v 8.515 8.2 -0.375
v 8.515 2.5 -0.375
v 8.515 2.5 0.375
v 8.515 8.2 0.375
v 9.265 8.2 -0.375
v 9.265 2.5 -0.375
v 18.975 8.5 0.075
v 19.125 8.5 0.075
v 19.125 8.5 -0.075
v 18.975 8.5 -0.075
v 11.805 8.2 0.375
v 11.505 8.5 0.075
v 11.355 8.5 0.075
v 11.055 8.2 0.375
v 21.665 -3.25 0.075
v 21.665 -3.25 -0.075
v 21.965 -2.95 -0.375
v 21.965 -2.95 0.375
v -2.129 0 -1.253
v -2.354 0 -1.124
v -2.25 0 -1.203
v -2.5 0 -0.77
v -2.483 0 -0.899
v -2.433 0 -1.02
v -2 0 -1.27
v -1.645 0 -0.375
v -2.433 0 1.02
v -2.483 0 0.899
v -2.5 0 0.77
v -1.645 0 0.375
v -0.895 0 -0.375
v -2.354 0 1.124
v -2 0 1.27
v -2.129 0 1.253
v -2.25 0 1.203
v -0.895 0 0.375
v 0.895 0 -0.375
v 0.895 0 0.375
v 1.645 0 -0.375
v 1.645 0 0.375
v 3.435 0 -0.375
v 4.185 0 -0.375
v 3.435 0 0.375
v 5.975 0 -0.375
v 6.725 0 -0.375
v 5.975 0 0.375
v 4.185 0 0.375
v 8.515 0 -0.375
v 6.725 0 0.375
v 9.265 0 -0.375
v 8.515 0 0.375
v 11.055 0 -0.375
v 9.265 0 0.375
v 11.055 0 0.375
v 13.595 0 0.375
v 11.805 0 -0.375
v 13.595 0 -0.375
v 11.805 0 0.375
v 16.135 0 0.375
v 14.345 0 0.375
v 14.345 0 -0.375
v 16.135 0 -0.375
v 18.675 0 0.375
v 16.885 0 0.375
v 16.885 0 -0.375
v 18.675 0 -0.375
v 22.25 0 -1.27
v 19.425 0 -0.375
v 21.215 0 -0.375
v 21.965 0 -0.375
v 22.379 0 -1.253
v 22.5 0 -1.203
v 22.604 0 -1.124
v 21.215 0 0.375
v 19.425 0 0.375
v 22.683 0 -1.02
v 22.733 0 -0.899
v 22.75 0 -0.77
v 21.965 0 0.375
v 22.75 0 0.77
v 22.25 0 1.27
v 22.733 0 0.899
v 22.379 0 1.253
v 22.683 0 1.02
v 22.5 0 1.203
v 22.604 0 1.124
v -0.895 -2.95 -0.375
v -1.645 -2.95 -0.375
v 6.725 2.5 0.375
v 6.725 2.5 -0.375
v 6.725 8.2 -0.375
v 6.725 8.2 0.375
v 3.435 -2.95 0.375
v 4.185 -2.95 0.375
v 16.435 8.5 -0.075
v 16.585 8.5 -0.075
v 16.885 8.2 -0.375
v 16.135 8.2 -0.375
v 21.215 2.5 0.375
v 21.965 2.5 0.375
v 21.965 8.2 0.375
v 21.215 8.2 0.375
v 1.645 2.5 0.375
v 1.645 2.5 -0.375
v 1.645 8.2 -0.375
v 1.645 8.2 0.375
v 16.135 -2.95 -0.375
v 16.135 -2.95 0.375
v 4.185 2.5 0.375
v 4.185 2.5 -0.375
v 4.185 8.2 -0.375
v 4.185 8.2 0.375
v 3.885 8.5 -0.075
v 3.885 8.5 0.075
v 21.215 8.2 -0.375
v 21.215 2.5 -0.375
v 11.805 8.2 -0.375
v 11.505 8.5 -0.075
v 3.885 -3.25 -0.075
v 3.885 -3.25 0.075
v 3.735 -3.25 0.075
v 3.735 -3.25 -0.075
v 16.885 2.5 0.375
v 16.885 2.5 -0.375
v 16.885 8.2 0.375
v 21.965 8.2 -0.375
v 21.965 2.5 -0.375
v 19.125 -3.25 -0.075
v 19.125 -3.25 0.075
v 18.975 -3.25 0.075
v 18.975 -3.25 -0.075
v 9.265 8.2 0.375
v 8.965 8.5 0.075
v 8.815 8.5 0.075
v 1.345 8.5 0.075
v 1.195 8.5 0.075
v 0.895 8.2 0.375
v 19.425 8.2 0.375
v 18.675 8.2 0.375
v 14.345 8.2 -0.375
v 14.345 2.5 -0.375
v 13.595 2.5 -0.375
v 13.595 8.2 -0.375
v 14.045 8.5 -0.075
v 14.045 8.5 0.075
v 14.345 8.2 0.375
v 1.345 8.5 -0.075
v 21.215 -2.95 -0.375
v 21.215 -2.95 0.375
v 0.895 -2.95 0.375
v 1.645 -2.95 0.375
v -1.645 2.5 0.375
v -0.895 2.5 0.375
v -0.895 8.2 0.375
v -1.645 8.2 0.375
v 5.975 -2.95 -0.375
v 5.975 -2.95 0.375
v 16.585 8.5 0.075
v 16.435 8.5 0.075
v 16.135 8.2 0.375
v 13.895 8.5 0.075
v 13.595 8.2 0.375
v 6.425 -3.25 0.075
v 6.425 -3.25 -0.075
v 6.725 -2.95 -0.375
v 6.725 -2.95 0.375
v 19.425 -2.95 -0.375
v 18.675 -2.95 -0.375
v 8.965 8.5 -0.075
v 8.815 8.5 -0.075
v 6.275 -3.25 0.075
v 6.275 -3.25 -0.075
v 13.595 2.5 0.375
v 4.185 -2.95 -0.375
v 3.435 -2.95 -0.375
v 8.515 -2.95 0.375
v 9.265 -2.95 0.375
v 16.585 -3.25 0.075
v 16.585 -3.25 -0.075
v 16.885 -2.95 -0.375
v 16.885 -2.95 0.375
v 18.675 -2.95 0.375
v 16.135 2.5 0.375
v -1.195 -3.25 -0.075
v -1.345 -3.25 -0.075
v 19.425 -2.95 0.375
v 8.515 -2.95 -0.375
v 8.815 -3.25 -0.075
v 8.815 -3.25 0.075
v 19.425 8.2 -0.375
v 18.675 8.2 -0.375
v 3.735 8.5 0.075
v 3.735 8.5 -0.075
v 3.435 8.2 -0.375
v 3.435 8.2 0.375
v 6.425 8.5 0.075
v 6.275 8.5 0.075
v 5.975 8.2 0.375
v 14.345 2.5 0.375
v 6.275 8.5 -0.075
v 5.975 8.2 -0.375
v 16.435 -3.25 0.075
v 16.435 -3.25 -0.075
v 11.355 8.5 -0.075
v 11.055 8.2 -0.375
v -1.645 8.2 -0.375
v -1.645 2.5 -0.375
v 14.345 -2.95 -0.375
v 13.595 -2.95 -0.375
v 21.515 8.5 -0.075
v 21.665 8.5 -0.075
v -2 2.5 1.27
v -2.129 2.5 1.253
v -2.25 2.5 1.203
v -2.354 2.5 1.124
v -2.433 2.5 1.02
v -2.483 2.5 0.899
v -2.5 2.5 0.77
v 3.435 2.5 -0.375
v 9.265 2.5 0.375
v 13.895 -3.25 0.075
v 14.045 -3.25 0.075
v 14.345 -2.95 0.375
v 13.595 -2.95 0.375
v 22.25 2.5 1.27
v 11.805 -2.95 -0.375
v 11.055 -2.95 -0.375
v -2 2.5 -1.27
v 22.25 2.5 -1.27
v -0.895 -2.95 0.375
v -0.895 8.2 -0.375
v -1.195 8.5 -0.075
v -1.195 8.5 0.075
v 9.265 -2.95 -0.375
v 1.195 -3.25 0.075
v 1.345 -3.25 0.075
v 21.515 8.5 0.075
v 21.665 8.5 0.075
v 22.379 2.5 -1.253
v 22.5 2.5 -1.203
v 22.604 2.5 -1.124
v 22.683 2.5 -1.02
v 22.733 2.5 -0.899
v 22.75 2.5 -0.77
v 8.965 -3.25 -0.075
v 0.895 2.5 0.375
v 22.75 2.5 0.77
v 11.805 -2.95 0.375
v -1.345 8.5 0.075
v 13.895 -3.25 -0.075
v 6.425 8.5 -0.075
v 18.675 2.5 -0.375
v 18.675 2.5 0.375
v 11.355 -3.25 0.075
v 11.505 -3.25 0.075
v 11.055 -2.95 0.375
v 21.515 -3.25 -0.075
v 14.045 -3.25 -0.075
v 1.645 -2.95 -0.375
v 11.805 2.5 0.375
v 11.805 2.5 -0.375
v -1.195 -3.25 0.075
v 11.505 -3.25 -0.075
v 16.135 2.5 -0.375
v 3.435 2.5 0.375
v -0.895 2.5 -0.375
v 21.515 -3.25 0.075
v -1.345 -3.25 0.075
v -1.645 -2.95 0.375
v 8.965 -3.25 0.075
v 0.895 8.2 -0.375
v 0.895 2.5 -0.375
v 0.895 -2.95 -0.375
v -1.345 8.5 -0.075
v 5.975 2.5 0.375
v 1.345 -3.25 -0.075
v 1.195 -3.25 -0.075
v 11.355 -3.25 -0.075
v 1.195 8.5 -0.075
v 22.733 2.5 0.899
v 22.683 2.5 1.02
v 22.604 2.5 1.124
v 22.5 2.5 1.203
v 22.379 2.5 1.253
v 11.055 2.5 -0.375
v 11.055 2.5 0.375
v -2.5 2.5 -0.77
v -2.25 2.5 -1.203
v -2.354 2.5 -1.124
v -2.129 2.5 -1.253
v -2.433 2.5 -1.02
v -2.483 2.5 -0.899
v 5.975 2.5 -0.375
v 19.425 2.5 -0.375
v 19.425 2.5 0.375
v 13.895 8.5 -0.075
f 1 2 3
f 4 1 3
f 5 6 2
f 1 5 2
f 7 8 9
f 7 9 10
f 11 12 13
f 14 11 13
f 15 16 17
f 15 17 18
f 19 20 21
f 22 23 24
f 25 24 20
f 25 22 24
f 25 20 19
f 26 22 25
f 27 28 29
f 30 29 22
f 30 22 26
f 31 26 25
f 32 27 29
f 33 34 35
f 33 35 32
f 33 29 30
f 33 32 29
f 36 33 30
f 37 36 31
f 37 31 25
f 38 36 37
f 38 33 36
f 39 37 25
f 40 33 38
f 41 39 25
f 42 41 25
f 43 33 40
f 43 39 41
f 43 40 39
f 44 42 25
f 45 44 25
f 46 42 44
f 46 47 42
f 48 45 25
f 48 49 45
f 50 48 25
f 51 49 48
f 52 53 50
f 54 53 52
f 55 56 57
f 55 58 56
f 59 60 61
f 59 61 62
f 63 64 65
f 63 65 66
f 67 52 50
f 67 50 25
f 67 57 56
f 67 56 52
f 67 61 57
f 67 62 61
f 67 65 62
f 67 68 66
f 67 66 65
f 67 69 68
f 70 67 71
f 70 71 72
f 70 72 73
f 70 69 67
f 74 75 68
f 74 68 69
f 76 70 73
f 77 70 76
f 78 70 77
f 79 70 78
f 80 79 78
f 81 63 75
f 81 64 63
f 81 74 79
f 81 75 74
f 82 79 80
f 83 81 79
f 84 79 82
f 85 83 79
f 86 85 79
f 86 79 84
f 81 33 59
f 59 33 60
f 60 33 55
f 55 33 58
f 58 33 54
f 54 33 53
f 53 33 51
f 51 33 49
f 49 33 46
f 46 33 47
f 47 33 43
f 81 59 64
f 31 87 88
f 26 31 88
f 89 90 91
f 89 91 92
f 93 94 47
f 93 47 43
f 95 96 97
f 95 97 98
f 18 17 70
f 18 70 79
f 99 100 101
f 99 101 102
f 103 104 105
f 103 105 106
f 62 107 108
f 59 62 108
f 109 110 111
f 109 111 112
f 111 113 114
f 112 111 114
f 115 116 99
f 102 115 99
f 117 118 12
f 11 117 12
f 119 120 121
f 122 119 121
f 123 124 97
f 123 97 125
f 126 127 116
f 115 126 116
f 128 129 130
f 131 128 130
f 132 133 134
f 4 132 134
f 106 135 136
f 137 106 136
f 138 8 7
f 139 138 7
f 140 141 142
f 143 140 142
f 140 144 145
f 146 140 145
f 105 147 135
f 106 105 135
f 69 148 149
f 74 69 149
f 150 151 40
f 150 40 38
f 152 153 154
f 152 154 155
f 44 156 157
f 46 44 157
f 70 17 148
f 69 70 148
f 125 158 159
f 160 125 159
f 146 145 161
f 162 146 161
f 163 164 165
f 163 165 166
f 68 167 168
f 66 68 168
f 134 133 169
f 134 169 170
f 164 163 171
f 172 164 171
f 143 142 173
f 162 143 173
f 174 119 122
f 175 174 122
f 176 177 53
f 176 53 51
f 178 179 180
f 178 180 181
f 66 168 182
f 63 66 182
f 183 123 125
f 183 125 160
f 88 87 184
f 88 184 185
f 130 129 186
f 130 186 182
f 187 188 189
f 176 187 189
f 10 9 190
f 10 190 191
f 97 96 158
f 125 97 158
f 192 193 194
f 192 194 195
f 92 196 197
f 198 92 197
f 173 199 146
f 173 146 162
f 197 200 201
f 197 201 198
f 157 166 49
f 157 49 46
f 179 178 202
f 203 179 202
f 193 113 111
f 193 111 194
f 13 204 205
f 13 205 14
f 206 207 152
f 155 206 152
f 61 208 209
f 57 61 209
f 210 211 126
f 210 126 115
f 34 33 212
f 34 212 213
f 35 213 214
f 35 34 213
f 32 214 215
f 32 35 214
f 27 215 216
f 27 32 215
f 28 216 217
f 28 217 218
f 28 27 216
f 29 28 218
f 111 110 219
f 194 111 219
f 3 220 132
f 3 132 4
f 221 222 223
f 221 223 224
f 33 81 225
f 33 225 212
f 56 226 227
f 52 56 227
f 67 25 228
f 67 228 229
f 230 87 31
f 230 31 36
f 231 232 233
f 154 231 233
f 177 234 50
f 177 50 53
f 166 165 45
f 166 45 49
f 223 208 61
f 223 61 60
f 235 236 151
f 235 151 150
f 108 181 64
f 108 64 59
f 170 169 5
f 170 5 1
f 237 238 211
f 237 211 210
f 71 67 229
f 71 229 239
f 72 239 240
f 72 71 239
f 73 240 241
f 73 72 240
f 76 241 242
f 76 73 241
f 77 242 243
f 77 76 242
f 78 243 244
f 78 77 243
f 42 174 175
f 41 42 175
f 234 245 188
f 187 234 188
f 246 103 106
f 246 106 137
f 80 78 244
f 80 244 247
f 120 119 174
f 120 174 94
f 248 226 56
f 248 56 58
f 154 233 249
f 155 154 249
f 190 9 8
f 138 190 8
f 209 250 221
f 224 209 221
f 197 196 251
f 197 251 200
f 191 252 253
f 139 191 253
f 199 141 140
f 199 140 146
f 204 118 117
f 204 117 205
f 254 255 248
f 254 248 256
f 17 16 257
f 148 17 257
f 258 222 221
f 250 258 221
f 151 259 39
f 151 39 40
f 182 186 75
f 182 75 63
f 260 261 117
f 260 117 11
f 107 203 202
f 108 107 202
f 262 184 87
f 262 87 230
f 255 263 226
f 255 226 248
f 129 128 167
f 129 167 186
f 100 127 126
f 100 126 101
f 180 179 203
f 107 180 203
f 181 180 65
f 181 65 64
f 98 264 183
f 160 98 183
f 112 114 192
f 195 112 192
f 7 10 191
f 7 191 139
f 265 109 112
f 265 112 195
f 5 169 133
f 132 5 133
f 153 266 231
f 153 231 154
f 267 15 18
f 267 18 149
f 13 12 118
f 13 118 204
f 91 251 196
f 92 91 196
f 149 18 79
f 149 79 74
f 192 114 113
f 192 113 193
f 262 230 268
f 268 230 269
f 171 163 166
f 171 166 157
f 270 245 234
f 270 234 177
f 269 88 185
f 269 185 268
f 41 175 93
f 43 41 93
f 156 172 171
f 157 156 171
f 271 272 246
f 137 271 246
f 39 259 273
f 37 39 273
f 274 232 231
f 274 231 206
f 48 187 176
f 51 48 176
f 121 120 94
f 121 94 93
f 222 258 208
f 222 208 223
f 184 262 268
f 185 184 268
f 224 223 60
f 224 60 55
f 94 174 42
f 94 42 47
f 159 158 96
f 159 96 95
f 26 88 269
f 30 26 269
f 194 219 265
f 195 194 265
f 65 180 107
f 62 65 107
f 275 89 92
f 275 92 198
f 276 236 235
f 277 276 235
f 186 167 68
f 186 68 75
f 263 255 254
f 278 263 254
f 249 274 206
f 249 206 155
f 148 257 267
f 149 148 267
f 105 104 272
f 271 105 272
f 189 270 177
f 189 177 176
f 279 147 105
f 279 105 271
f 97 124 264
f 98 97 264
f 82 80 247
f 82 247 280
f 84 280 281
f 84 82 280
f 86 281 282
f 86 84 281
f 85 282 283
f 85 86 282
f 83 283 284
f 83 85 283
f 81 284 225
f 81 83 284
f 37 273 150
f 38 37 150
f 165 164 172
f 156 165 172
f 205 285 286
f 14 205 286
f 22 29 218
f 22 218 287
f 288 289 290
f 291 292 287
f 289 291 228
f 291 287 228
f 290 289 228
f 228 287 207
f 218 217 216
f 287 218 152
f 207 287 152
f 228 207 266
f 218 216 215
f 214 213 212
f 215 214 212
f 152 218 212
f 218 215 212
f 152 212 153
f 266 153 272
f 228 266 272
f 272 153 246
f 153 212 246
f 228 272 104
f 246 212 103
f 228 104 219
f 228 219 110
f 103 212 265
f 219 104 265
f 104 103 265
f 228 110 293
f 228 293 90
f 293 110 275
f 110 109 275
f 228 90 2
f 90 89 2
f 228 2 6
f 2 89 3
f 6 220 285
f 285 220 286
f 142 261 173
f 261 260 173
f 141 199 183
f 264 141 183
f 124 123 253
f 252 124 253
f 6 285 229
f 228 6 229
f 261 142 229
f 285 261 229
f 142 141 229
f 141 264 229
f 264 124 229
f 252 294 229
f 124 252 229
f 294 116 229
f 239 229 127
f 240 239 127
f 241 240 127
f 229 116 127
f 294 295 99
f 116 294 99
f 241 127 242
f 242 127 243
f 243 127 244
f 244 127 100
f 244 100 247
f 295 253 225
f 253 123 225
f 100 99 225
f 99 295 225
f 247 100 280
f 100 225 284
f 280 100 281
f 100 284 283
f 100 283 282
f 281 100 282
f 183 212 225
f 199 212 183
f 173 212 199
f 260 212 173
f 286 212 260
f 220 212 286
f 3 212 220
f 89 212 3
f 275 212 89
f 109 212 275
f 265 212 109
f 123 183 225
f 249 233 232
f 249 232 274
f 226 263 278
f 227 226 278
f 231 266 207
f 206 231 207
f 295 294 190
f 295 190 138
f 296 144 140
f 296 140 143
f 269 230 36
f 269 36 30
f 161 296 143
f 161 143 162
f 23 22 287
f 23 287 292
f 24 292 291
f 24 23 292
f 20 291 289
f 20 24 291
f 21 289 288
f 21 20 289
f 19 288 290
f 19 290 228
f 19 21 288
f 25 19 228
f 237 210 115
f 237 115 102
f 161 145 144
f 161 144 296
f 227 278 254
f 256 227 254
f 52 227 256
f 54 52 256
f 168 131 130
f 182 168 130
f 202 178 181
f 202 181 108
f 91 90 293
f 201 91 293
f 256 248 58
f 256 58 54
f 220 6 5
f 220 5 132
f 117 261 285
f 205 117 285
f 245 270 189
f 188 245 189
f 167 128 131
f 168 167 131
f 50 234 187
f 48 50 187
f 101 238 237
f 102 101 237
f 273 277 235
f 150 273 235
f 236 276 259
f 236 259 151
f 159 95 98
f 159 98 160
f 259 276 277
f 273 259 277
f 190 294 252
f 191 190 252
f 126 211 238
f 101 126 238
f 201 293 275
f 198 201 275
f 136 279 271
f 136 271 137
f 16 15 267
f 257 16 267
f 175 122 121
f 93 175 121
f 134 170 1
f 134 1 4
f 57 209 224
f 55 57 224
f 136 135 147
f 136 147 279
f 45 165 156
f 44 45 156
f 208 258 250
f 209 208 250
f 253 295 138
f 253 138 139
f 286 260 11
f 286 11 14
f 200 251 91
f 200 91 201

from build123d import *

# Parameters (mm, degrees)
BOSS_EXTRUDE1_DEPTH      = 2.5
BOSS_EXTRUDE2_DEPTH      = 8.5
BOSS_EXTRUDE2_DEPTH_BACK = 3.25
SKETCH2_W                = 0.75
SKETCH2_H                = 0.75
CHAMFER1_SIZE            = 0.3


with BuildPart() as part:
    # Sketch1 → Boss-Extrude1 (new body)
    with BuildSketch(Plane(origin=(0, 0, 0), x_dir=(-1, 0, 0), z_dir=(0, 1, 0))):
        with BuildLine():
            Line((-22.25, 1.27), (2, 1.27))
            ThreePointArc((2, 1.27), (2.353553391, 1.123553391), (2.5, 0.77))
            Line((2.5, 0.77), (2.5, -0.77))
            ThreePointArc((2.5, -0.77), (2.353553391, -1.123553391), (2, -1.27))
            Line((2, -1.27), (-22.25, -1.27))
            ThreePointArc((-22.25, -1.27), (-22.603553391, -1.123553391), (-22.75, -0.77))
            Line((-22.75, -0.77), (-22.75, 0.77))
            ThreePointArc((-22.75, 0.77), (-22.603553391, 1.123553391), (-22.25, 1.27))
        make_face()
    extrude(amount=BOSS_EXTRUDE1_DEPTH)

    # Sketch2 → Boss-Extrude2 (add, two sides: drawn at the far end of the back side and taken through both)
    with BuildSketch(Plane(origin=(0, 0, 0), x_dir=(-1, 0, 0), z_dir=(0, 1, 0)).offset(-BOSS_EXTRUDE2_DEPTH_BACK)):
        with Locations((1.27, 0)):
            Rectangle(SKETCH2_W, SKETCH2_H)
        with Locations((-1.27, 0)):
            Rectangle(SKETCH2_W, SKETCH2_H)
        with Locations((-3.81, 0)):
            Rectangle(SKETCH2_W, SKETCH2_H)
        with Locations((-6.35, 0)):
            Rectangle(SKETCH2_W, SKETCH2_H)
        with Locations((-8.89, 0)):
            Rectangle(SKETCH2_W, SKETCH2_H)
        with Locations((-11.43, 0)):
            Rectangle(SKETCH2_W, SKETCH2_H)
        with Locations((-13.97, 0)):
            Rectangle(SKETCH2_W, SKETCH2_H)
        with Locations((-16.51, 0)):
            Rectangle(SKETCH2_W, SKETCH2_H)
        with Locations((-19.05, 0)):
            Rectangle(SKETCH2_W, SKETCH2_H)
        with Locations((-21.59, 0)):
            Rectangle(SKETCH2_W, SKETCH2_H)
    extrude(amount=BOSS_EXTRUDE2_DEPTH + BOSS_EXTRUDE2_DEPTH_BACK)

    # Chamfer1
    chamfer1_edges = [part.edges().sort_by_distance(p)[0] for p in [
        (9.265, -3.25, 0),
        (8.89, -3.25, 0.375),
        (8.515, -3.25, 0),
        (8.89, -3.25, -0.375),
        (9.265, 8.5, 0),
        (8.89, 8.5, -0.375),
        (8.515, 8.5, 0),
        (8.89, 8.5, 0.375),
        (11.055, -3.25, 0),
        (11.43, -3.25, -0.375),
        (11.805, -3.25, 0),
        (11.43, -3.25, 0.375),
        (11.055, 8.5, 0),
        (11.43, 8.5, 0.375),
        (11.805, 8.5, 0),
        (11.43, 8.5, -0.375),
        (14.345, -3.25, 0),
        (13.97, -3.25, 0.375),
        (13.595, -3.25, 0),
        (13.97, -3.25, -0.375),
        (14.345, 8.5, 0),
        (13.97, 8.5, -0.375),
        (13.595, 8.5, 0),
        (13.97, 8.5, 0.375),
        (16.135, -3.25, 0),
        (16.51, -3.25, -0.375),
        (16.885, -3.25, 0),
        (16.51, -3.25, 0.375),
        (16.135, 8.5, 0),
        (16.51, 8.5, 0.375),
        (16.885, 8.5, 0),
        (16.51, 8.5, -0.375),
        (19.425, -3.25, 0),
        (19.05, -3.25, 0.375),
        (18.675, -3.25, 0),
        (19.05, -3.25, -0.375),
        (19.425, 8.5, 0),
        (19.05, 8.5, -0.375),
        (18.675, 8.5, 0),
        (19.05, 8.5, 0.375),
        (21.215, -3.25, 0),
        (21.59, -3.25, -0.375),
        (21.965, -3.25, 0),
        (21.59, -3.25, 0.375),
        (21.215, 8.5, 0),
        (21.59, 8.5, 0.375),
        (21.965, 8.5, 0),
        (21.59, 8.5, -0.375),
        (-0.895, -3.25, 0),
        (-1.27, -3.25, 0.375),
        (-1.645, -3.25, 0),
        (-1.27, -3.25, -0.375),
        (-0.895, 8.5, 0),
        (-1.27, 8.5, -0.375),
        (-1.645, 8.5, 0),
        (-1.27, 8.5, 0.375),
        (0.895, -3.25, 0),
        (1.27, -3.25, -0.375),
        (1.645, -3.25, 0),
        (1.27, -3.25, 0.375),
        (0.895, 8.5, 0),
        (1.27, 8.5, 0.375),
        (1.645, 8.5, 0),
        (1.27, 8.5, -0.375),
        (4.185, -3.25, 0),
        (3.81, -3.25, 0.375),
        (3.435, -3.25, 0),
        (3.81, -3.25, -0.375),
        (4.185, 8.5, 0),
        (3.81, 8.5, -0.375),
        (3.435, 8.5, 0),
        (3.81, 8.5, 0.375),
        (5.975, -3.25, 0),
        (6.35, -3.25, -0.375),
        (6.725, -3.25, 0),
        (6.35, -3.25, 0.375),
        (5.975, 8.5, 0),
        (6.35, 8.5, 0.375),
        (6.725, 8.5, 0),
        (6.35, 8.5, -0.375),
    ]]
    chamfer(chamfer1_edges, length=CHAMFER1_SIZE)


solid = part.part
